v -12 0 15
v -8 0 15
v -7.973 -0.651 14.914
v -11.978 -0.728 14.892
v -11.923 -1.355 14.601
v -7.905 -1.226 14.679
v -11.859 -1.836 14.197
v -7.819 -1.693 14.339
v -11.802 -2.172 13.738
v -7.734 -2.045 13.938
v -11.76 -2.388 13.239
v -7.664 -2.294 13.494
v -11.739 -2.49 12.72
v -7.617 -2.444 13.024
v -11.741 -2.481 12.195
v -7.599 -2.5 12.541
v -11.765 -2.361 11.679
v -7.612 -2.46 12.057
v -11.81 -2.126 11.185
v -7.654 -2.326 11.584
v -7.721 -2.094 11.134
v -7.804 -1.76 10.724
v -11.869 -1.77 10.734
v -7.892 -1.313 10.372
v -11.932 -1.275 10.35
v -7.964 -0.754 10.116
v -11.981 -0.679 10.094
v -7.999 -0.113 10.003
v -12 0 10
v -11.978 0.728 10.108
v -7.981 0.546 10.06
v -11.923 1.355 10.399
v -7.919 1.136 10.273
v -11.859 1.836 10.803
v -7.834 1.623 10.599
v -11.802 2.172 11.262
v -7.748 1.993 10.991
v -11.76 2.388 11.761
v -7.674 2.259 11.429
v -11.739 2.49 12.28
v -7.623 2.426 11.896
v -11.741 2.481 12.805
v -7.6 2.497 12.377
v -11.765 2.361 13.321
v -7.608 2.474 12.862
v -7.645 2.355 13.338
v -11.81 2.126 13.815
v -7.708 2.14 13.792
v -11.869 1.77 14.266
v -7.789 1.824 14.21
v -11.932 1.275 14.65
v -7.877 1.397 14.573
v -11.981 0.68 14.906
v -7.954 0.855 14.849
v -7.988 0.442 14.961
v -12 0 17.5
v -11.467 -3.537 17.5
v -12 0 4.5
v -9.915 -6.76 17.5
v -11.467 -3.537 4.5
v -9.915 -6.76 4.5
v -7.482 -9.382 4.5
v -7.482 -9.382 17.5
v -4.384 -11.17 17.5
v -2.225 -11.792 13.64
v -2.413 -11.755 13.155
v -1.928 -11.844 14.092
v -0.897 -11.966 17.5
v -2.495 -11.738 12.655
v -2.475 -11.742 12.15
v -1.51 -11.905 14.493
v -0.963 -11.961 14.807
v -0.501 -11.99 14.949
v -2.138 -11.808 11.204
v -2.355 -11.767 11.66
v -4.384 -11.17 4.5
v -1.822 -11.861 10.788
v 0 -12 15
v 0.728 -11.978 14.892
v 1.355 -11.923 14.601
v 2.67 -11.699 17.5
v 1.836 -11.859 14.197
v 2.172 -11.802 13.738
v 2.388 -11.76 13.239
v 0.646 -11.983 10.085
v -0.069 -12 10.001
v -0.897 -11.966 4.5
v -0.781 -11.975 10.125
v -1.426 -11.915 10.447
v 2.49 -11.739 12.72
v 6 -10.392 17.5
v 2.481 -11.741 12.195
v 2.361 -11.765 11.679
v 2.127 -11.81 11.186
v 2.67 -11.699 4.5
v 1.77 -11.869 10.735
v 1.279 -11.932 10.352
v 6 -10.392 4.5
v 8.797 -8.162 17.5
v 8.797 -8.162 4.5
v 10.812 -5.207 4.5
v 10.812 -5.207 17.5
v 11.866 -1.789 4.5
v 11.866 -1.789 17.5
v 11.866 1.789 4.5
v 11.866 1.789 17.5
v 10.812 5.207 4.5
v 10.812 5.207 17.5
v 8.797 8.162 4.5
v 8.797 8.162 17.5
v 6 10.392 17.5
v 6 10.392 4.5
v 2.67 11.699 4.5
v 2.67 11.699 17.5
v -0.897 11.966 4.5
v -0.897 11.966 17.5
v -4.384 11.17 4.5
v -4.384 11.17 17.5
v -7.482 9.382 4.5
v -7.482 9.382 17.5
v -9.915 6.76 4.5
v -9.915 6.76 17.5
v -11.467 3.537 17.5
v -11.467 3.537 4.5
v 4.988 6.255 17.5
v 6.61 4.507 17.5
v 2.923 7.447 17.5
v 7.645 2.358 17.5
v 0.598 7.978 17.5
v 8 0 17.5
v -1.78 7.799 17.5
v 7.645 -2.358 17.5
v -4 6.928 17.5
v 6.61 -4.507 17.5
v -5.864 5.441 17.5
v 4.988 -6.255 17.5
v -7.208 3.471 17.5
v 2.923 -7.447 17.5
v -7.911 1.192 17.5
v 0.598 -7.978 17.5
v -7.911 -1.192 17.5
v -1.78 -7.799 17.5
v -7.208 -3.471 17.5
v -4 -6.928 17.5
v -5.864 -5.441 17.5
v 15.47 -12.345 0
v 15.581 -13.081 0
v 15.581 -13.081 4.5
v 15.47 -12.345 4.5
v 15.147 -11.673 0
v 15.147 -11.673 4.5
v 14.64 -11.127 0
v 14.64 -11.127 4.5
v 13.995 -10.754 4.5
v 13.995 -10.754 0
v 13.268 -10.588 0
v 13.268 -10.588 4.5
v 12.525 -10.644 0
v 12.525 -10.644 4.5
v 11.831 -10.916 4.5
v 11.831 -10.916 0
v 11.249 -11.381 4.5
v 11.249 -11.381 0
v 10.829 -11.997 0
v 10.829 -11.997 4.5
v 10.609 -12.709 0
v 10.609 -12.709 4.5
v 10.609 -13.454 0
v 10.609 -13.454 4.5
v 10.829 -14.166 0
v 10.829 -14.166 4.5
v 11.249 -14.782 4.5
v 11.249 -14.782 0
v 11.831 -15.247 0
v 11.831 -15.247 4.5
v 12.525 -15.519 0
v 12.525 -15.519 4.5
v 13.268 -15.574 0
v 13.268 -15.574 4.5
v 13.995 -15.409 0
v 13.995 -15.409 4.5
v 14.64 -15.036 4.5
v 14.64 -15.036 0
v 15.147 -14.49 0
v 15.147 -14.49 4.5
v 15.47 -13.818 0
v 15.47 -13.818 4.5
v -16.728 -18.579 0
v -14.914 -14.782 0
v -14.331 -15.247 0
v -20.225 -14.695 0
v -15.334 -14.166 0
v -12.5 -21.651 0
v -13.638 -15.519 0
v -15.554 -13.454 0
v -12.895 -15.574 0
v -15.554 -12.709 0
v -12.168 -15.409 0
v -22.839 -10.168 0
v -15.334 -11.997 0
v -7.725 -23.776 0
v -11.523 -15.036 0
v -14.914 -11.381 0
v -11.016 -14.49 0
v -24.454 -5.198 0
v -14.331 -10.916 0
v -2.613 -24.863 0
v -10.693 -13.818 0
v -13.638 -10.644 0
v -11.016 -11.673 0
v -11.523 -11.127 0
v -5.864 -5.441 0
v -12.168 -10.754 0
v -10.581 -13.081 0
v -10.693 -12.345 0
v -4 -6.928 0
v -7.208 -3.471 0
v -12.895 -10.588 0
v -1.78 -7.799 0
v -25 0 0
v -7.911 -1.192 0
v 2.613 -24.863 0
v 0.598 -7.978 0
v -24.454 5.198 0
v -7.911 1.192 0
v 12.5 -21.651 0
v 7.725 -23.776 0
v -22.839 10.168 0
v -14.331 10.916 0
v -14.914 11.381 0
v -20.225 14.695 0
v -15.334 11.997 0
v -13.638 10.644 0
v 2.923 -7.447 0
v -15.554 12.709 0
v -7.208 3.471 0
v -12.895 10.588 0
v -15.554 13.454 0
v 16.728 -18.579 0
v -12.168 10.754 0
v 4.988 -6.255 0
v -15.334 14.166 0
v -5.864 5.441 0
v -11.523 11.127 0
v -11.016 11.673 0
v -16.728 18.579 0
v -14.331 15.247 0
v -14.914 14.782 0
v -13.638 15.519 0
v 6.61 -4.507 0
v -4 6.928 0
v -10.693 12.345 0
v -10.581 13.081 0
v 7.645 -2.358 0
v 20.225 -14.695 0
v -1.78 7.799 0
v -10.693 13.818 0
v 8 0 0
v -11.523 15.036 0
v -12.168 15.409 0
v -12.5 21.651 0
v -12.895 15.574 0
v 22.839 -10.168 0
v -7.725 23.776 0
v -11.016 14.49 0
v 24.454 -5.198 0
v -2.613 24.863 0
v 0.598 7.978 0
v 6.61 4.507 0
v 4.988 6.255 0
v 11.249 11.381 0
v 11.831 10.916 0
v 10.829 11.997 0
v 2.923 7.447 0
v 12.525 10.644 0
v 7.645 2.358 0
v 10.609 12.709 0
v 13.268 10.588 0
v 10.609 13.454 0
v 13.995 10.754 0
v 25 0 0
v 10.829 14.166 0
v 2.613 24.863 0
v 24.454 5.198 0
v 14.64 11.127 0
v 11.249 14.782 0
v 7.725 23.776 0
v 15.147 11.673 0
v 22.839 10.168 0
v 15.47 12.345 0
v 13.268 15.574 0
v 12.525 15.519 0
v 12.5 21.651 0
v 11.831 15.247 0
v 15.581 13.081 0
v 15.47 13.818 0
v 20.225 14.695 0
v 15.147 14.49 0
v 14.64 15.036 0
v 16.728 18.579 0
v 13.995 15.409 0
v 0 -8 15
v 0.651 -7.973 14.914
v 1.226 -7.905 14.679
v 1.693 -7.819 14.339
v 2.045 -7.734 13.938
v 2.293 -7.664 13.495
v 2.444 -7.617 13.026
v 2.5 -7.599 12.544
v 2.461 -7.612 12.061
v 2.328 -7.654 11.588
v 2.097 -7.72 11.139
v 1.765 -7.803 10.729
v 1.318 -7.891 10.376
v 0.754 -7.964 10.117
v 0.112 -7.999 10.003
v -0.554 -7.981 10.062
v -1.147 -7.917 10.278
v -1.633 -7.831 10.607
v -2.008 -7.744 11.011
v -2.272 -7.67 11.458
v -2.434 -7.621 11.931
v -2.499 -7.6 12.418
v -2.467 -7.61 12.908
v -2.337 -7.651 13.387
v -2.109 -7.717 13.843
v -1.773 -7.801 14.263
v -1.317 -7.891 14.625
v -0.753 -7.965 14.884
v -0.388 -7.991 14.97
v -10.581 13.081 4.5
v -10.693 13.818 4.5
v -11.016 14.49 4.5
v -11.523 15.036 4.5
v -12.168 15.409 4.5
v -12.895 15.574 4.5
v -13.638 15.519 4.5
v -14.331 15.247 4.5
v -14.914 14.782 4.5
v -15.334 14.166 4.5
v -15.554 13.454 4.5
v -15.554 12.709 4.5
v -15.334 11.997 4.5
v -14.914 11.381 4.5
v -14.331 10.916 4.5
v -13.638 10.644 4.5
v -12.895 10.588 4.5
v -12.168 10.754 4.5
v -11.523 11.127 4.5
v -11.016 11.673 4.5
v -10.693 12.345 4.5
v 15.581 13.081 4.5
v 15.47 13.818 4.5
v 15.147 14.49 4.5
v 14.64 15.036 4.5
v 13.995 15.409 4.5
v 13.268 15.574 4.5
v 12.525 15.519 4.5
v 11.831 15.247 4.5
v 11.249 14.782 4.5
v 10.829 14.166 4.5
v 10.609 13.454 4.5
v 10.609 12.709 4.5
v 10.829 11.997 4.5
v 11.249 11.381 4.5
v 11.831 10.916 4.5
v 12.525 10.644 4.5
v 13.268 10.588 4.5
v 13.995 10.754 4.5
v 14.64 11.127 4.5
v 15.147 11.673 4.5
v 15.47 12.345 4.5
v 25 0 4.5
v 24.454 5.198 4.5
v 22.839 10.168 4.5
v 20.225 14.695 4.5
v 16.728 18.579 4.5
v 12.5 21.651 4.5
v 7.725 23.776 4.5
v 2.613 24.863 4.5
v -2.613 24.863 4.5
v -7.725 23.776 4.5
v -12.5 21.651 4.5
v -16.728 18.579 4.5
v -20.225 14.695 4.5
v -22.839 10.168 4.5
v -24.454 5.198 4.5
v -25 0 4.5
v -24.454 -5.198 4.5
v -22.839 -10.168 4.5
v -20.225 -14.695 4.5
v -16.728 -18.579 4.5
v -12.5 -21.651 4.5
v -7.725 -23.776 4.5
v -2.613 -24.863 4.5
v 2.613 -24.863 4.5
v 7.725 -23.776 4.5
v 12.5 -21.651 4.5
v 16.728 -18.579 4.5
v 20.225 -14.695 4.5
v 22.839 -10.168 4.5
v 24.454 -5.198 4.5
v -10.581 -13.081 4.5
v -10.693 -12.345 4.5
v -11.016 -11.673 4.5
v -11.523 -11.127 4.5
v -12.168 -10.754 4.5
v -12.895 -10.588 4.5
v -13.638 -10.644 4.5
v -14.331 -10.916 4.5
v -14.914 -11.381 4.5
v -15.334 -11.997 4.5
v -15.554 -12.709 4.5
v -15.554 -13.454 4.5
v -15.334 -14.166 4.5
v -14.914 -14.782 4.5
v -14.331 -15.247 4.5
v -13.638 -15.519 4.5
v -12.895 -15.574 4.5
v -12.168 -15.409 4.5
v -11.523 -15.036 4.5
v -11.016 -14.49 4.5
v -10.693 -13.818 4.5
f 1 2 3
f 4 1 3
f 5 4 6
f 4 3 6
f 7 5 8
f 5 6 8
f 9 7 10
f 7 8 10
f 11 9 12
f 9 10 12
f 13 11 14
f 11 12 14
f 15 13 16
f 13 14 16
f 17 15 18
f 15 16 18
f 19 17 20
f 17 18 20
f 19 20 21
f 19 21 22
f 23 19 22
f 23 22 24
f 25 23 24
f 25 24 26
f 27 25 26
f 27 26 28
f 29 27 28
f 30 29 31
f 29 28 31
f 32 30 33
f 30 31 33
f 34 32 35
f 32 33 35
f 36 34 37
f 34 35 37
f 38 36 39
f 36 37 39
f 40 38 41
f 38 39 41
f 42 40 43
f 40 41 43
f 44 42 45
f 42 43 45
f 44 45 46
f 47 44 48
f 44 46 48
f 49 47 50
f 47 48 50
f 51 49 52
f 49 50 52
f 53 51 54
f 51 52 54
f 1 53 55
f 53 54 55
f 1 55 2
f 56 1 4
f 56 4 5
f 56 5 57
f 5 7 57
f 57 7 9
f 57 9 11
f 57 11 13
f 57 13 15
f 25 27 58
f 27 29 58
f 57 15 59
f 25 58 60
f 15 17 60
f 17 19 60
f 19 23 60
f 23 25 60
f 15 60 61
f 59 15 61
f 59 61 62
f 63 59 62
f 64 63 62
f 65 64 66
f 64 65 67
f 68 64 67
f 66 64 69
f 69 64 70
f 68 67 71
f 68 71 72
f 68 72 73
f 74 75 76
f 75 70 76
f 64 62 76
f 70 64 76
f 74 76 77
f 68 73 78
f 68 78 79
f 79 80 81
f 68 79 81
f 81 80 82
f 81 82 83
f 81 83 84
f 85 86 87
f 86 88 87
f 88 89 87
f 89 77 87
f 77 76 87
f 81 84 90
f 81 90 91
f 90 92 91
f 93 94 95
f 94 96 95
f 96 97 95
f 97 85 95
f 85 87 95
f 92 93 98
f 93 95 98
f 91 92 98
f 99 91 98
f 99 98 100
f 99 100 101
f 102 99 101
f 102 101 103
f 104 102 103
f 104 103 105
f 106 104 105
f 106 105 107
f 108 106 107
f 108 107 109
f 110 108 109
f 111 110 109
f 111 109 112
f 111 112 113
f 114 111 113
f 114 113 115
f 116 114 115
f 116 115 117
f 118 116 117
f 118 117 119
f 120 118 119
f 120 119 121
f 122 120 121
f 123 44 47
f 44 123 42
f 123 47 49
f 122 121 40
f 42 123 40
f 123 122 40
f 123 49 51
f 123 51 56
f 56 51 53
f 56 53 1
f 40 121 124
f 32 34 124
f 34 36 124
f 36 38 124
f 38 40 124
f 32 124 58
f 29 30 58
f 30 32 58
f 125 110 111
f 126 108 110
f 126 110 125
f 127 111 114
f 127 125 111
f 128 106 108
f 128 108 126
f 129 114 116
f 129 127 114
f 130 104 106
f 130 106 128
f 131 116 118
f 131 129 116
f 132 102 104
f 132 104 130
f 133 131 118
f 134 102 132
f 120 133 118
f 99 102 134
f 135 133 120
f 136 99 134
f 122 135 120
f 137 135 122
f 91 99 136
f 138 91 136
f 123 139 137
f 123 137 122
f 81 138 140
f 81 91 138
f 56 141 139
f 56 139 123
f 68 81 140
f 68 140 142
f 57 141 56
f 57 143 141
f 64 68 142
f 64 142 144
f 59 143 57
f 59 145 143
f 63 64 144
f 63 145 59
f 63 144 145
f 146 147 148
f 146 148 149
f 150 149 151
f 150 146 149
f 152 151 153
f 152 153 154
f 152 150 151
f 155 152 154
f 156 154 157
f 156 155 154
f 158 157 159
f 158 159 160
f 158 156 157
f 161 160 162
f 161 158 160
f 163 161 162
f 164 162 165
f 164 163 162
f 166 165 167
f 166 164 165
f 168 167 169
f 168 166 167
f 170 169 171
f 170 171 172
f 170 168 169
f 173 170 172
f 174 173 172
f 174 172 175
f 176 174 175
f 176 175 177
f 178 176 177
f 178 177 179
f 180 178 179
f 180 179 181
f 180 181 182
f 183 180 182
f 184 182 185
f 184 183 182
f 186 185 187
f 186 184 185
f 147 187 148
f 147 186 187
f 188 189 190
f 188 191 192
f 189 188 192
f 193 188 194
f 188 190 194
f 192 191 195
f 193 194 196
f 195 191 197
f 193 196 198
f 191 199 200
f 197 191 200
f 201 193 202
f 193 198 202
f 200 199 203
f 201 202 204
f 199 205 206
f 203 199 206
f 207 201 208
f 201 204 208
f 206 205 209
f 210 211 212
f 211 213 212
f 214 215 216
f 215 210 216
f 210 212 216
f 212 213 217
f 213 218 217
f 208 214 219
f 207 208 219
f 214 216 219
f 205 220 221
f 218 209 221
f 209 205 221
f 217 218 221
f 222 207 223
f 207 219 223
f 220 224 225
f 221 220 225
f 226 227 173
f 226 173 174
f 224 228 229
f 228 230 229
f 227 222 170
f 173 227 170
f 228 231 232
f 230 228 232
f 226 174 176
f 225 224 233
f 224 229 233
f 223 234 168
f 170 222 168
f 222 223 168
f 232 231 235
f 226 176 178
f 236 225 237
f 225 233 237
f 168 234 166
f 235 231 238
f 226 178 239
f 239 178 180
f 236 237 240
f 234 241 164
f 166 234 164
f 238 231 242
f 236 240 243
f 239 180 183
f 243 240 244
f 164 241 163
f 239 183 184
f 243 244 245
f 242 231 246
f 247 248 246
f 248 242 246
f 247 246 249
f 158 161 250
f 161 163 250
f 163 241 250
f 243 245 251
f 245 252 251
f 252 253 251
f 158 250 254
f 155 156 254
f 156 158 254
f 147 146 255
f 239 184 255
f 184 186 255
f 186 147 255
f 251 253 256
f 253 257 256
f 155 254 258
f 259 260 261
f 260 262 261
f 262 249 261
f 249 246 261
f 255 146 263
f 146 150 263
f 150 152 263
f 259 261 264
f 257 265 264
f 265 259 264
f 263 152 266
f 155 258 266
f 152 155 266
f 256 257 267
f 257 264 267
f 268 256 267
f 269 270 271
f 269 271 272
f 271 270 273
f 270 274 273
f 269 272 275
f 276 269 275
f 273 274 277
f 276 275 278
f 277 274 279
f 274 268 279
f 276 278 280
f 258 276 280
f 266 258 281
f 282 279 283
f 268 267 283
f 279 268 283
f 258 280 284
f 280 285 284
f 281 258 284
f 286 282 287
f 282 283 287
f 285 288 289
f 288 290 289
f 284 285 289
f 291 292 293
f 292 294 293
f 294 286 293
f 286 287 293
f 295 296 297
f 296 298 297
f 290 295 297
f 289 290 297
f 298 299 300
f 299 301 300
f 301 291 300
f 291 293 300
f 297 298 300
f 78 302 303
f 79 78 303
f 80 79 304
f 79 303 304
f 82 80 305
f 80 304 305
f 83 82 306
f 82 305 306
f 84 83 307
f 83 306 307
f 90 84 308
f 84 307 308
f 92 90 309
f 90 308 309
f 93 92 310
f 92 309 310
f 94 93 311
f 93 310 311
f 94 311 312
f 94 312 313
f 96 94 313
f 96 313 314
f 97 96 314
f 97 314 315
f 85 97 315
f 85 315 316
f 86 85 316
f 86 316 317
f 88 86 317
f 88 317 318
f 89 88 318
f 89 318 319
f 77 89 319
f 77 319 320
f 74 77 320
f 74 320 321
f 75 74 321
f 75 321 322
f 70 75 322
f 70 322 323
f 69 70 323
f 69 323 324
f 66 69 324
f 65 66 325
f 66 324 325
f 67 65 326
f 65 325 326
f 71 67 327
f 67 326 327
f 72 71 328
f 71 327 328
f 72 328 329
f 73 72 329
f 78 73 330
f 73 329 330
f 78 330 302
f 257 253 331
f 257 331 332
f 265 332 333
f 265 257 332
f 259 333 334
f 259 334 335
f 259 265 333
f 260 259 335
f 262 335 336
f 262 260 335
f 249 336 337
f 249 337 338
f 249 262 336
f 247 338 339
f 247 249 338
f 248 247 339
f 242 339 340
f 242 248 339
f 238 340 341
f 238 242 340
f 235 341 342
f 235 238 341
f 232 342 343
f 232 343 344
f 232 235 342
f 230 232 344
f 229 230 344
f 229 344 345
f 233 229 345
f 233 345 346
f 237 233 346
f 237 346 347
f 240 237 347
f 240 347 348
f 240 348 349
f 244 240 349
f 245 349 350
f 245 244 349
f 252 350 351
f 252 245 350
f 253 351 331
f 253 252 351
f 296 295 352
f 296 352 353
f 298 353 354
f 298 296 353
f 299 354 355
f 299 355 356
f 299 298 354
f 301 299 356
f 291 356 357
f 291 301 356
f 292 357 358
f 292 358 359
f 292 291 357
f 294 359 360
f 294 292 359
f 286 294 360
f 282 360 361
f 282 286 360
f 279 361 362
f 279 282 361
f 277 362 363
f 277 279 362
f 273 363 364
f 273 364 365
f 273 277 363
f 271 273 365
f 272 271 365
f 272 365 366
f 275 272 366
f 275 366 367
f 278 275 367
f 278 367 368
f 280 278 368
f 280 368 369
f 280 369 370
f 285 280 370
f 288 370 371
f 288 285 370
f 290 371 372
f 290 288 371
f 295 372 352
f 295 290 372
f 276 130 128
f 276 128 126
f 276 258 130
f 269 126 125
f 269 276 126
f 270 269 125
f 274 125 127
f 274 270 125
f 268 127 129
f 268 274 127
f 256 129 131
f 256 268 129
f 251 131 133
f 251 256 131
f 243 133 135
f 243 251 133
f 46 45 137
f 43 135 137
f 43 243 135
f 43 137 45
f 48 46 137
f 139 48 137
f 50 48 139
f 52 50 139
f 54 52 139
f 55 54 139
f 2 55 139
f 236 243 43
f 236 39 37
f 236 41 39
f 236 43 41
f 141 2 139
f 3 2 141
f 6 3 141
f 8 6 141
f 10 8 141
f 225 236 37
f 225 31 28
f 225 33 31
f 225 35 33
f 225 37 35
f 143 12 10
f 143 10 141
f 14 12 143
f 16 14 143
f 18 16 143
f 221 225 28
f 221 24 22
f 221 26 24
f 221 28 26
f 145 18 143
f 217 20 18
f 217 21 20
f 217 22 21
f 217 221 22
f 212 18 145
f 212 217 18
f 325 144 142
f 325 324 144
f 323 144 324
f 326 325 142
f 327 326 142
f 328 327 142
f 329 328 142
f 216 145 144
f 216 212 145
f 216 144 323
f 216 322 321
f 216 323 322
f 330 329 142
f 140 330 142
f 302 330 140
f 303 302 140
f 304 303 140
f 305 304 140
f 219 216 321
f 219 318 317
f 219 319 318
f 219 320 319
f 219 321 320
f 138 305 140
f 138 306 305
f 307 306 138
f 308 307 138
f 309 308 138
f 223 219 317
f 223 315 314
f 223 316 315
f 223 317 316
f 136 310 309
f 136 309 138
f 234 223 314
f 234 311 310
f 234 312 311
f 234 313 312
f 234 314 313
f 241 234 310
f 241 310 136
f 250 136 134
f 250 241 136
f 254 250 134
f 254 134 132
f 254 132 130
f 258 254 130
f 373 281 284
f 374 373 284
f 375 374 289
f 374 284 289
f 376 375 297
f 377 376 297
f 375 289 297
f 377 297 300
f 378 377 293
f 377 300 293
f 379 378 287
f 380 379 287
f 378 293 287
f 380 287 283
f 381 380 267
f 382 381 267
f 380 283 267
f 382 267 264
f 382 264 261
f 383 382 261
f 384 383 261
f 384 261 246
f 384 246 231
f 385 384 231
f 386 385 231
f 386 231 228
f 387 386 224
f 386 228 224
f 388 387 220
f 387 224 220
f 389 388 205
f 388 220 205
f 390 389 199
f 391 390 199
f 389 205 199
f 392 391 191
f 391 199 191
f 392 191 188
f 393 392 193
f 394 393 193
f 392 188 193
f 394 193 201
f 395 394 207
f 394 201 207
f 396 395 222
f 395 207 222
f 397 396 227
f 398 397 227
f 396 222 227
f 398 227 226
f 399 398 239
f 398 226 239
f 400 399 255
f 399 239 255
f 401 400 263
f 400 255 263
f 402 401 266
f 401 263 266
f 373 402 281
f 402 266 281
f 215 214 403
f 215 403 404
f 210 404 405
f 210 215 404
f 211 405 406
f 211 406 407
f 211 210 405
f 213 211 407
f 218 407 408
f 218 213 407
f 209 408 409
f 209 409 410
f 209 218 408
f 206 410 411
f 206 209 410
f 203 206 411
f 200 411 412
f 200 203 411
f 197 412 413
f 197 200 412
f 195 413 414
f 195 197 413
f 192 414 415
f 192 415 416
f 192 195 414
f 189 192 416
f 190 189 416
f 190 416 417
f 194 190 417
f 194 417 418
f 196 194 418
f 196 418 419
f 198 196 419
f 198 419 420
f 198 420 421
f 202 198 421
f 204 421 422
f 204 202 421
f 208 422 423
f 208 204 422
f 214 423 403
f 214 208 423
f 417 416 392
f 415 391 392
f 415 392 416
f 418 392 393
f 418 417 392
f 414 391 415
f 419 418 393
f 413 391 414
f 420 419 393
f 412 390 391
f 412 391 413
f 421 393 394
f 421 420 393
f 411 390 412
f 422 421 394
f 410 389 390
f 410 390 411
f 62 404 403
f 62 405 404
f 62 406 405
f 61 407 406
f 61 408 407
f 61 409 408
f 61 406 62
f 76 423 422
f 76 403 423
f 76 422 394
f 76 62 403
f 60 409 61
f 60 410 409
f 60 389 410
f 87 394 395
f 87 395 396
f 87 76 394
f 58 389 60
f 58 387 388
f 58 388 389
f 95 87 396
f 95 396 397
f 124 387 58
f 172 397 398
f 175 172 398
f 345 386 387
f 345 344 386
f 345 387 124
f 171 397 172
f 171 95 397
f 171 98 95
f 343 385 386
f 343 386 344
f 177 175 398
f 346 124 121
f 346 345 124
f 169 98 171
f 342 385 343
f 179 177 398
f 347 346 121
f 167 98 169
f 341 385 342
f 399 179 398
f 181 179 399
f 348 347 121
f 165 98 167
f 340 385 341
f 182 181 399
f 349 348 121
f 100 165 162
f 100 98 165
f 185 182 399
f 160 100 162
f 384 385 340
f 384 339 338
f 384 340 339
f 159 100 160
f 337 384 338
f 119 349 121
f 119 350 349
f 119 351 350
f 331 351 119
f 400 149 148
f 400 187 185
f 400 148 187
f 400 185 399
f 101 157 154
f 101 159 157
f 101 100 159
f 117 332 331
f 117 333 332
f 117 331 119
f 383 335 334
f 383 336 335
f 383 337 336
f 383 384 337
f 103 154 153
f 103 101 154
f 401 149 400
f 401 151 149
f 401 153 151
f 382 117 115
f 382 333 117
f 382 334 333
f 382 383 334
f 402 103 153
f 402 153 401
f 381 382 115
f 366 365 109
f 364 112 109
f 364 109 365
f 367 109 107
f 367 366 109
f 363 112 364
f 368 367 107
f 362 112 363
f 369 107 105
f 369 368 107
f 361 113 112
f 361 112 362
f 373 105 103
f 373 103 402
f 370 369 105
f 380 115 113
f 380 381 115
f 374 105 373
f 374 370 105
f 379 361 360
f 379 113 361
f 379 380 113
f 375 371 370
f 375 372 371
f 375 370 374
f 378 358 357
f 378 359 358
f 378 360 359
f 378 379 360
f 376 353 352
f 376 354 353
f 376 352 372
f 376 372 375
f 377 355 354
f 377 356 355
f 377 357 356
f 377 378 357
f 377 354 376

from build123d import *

# Parameters (mm, degrees)
SKETCH_1_R          = 25
SKETCH_1_R_2        = 8
SKETCH_1_R_3        = 2.5
EXTRUDE_1_DEPTH     = 4.5
SKETCH_2_R          = 12
SKETCH_2_R_2        = 8
EXTRUDE_2_DEPTH     = 13
SKETCH_3_R          = 2.5
CUT_EXTRUDE_1_DEPTH = 26
SKETCH_5_R          = 2.5
CUT_EXTRUDE_4_DEPTH = 26


with BuildPart() as part:
    # 草图1 → 凸台-拉伸1 (new body)
    with BuildSketch(Plane.XY):
        Circle(SKETCH_1_R)
        Circle(SKETCH_1_R_2, mode=Mode.SUBTRACT)
        with Locations((13.081475452, 13.081475452)):
            Circle(SKETCH_1_R_3, mode=Mode.SUBTRACT)
        with Locations((13.081475452, -13.081475452)):
            Circle(SKETCH_1_R_3, mode=Mode.SUBTRACT)
        with Locations((-13.081475452, -13.081475452)):
            Circle(SKETCH_1_R_3, mode=Mode.SUBTRACT)
        with Locations((-13.081475452, 13.081475452)):
            Circle(SKETCH_1_R_3, mode=Mode.SUBTRACT)
    extrude(amount=EXTRUDE_1_DEPTH)

    # 草图2 → 凸台-拉伸2 (add)
    with BuildSketch(Plane.XY.offset(4.5)):
        with Locations(Location((0, 0, 0), (0, 0, 180))):
            Circle(SKETCH_2_R)
        Circle(SKETCH_2_R_2, mode=Mode.SUBTRACT)
    extrude(amount=EXTRUDE_2_DEPTH)

    # 草图3 → 切除-拉伸1 (cut)
    with BuildSketch(Plane(origin=(0, 0, 0), x_dir=(1, 0, 0), z_dir=(0, 1, 0))):
        with Locations(Location((0, -12.5, 0), (0, 0, 270))):
            Circle(SKETCH_3_R)
    extrude(amount=-CUT_EXTRUDE_1_DEPTH, mode=Mode.SUBTRACT)

    # 草图5 → 切除-拉伸4 (cut)
    with BuildSketch(Plane(origin=(0, 0, 0), x_dir=(0, 0, -1), z_dir=(1, 0, 0))):
        with Locations(Location((-12.5, 0, 0), (0, 0, 180))):
            Circle(SKETCH_5_R)
    extrude(amount=-CUT_EXTRUDE_4_DEPTH, mode=Mode.SUBTRACT)


solid = part.part
